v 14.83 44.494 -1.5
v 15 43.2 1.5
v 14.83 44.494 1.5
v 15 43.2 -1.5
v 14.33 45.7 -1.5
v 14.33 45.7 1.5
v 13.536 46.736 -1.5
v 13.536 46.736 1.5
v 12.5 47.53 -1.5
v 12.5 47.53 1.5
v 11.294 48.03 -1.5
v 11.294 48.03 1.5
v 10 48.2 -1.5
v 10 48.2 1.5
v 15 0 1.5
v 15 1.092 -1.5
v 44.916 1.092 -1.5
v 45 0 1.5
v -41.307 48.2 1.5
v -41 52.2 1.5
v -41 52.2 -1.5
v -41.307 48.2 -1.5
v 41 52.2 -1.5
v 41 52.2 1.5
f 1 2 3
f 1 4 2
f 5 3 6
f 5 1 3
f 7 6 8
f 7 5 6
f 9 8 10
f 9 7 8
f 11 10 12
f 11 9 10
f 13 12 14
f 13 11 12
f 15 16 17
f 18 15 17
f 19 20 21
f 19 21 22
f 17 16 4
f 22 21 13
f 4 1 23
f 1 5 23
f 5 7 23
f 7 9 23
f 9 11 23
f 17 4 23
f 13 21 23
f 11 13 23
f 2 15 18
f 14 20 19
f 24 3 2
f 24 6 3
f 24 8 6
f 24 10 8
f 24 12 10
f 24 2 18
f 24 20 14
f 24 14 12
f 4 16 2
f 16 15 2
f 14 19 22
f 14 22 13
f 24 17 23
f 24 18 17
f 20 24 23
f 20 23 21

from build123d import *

# Parameters (mm, degrees)
BOSS_EXTRUDE1_DEPTH = 1.5
CHAMFER1_SIZE2      = 1.091910703
CHAMFER1_SIZE       = 3
SKETCH3_W           = 60
SKETCH3_H           = 48.2
CUT_EXTRUDE2_DEPTH  = 69.98434605
FILLET1_R           = 5


with BuildPart() as part:
    # Sketch1 → Boss-Extrude1 (new, symmetric)
    with BuildSketch(Plane.XY):
        Polygon((-45, 0), (45, 0), (41, 52.2), (-41, 52.2), align=None)
    extrude(amount=BOSS_EXTRUDE1_DEPTH, both=True)

    # Chamfer1
    chamfer1_edges = [part.edges().sort_by_distance(p)[0] for p in [
        (0, 0, -1.5),
    ]]
    chamfer1_side = [part.faces().sort_by_distance(p)[0] for p in [
        (0, 0, -1.478161786),
    ]]
    chamfer(chamfer1_edges, length=CHAMFER1_SIZE - 0.0001, length2=CHAMFER1_SIZE2 - 0.0001, reference=chamfer1_side[0])  # a hair under: the kernel refuses the full size

    # Sketch3 → Cut-Extrude2 (cut, through all)
    with BuildSketch(Plane.XY.offset(1.5)):
        with Locations((-15, 24.1)):
            Rectangle(SKETCH3_W, SKETCH3_H)
    extrude(amount=-CUT_EXTRUDE2_DEPTH, mode=Mode.SUBTRACT)

    # Fillet1
    fillet1_edges = [part.edges().sort_by_distance(p)[0] for p in [
        (15, 48.2, 0),
    ]]
    fillet(fillet1_edges, radius=FILLET1_R)


solid = part.part
